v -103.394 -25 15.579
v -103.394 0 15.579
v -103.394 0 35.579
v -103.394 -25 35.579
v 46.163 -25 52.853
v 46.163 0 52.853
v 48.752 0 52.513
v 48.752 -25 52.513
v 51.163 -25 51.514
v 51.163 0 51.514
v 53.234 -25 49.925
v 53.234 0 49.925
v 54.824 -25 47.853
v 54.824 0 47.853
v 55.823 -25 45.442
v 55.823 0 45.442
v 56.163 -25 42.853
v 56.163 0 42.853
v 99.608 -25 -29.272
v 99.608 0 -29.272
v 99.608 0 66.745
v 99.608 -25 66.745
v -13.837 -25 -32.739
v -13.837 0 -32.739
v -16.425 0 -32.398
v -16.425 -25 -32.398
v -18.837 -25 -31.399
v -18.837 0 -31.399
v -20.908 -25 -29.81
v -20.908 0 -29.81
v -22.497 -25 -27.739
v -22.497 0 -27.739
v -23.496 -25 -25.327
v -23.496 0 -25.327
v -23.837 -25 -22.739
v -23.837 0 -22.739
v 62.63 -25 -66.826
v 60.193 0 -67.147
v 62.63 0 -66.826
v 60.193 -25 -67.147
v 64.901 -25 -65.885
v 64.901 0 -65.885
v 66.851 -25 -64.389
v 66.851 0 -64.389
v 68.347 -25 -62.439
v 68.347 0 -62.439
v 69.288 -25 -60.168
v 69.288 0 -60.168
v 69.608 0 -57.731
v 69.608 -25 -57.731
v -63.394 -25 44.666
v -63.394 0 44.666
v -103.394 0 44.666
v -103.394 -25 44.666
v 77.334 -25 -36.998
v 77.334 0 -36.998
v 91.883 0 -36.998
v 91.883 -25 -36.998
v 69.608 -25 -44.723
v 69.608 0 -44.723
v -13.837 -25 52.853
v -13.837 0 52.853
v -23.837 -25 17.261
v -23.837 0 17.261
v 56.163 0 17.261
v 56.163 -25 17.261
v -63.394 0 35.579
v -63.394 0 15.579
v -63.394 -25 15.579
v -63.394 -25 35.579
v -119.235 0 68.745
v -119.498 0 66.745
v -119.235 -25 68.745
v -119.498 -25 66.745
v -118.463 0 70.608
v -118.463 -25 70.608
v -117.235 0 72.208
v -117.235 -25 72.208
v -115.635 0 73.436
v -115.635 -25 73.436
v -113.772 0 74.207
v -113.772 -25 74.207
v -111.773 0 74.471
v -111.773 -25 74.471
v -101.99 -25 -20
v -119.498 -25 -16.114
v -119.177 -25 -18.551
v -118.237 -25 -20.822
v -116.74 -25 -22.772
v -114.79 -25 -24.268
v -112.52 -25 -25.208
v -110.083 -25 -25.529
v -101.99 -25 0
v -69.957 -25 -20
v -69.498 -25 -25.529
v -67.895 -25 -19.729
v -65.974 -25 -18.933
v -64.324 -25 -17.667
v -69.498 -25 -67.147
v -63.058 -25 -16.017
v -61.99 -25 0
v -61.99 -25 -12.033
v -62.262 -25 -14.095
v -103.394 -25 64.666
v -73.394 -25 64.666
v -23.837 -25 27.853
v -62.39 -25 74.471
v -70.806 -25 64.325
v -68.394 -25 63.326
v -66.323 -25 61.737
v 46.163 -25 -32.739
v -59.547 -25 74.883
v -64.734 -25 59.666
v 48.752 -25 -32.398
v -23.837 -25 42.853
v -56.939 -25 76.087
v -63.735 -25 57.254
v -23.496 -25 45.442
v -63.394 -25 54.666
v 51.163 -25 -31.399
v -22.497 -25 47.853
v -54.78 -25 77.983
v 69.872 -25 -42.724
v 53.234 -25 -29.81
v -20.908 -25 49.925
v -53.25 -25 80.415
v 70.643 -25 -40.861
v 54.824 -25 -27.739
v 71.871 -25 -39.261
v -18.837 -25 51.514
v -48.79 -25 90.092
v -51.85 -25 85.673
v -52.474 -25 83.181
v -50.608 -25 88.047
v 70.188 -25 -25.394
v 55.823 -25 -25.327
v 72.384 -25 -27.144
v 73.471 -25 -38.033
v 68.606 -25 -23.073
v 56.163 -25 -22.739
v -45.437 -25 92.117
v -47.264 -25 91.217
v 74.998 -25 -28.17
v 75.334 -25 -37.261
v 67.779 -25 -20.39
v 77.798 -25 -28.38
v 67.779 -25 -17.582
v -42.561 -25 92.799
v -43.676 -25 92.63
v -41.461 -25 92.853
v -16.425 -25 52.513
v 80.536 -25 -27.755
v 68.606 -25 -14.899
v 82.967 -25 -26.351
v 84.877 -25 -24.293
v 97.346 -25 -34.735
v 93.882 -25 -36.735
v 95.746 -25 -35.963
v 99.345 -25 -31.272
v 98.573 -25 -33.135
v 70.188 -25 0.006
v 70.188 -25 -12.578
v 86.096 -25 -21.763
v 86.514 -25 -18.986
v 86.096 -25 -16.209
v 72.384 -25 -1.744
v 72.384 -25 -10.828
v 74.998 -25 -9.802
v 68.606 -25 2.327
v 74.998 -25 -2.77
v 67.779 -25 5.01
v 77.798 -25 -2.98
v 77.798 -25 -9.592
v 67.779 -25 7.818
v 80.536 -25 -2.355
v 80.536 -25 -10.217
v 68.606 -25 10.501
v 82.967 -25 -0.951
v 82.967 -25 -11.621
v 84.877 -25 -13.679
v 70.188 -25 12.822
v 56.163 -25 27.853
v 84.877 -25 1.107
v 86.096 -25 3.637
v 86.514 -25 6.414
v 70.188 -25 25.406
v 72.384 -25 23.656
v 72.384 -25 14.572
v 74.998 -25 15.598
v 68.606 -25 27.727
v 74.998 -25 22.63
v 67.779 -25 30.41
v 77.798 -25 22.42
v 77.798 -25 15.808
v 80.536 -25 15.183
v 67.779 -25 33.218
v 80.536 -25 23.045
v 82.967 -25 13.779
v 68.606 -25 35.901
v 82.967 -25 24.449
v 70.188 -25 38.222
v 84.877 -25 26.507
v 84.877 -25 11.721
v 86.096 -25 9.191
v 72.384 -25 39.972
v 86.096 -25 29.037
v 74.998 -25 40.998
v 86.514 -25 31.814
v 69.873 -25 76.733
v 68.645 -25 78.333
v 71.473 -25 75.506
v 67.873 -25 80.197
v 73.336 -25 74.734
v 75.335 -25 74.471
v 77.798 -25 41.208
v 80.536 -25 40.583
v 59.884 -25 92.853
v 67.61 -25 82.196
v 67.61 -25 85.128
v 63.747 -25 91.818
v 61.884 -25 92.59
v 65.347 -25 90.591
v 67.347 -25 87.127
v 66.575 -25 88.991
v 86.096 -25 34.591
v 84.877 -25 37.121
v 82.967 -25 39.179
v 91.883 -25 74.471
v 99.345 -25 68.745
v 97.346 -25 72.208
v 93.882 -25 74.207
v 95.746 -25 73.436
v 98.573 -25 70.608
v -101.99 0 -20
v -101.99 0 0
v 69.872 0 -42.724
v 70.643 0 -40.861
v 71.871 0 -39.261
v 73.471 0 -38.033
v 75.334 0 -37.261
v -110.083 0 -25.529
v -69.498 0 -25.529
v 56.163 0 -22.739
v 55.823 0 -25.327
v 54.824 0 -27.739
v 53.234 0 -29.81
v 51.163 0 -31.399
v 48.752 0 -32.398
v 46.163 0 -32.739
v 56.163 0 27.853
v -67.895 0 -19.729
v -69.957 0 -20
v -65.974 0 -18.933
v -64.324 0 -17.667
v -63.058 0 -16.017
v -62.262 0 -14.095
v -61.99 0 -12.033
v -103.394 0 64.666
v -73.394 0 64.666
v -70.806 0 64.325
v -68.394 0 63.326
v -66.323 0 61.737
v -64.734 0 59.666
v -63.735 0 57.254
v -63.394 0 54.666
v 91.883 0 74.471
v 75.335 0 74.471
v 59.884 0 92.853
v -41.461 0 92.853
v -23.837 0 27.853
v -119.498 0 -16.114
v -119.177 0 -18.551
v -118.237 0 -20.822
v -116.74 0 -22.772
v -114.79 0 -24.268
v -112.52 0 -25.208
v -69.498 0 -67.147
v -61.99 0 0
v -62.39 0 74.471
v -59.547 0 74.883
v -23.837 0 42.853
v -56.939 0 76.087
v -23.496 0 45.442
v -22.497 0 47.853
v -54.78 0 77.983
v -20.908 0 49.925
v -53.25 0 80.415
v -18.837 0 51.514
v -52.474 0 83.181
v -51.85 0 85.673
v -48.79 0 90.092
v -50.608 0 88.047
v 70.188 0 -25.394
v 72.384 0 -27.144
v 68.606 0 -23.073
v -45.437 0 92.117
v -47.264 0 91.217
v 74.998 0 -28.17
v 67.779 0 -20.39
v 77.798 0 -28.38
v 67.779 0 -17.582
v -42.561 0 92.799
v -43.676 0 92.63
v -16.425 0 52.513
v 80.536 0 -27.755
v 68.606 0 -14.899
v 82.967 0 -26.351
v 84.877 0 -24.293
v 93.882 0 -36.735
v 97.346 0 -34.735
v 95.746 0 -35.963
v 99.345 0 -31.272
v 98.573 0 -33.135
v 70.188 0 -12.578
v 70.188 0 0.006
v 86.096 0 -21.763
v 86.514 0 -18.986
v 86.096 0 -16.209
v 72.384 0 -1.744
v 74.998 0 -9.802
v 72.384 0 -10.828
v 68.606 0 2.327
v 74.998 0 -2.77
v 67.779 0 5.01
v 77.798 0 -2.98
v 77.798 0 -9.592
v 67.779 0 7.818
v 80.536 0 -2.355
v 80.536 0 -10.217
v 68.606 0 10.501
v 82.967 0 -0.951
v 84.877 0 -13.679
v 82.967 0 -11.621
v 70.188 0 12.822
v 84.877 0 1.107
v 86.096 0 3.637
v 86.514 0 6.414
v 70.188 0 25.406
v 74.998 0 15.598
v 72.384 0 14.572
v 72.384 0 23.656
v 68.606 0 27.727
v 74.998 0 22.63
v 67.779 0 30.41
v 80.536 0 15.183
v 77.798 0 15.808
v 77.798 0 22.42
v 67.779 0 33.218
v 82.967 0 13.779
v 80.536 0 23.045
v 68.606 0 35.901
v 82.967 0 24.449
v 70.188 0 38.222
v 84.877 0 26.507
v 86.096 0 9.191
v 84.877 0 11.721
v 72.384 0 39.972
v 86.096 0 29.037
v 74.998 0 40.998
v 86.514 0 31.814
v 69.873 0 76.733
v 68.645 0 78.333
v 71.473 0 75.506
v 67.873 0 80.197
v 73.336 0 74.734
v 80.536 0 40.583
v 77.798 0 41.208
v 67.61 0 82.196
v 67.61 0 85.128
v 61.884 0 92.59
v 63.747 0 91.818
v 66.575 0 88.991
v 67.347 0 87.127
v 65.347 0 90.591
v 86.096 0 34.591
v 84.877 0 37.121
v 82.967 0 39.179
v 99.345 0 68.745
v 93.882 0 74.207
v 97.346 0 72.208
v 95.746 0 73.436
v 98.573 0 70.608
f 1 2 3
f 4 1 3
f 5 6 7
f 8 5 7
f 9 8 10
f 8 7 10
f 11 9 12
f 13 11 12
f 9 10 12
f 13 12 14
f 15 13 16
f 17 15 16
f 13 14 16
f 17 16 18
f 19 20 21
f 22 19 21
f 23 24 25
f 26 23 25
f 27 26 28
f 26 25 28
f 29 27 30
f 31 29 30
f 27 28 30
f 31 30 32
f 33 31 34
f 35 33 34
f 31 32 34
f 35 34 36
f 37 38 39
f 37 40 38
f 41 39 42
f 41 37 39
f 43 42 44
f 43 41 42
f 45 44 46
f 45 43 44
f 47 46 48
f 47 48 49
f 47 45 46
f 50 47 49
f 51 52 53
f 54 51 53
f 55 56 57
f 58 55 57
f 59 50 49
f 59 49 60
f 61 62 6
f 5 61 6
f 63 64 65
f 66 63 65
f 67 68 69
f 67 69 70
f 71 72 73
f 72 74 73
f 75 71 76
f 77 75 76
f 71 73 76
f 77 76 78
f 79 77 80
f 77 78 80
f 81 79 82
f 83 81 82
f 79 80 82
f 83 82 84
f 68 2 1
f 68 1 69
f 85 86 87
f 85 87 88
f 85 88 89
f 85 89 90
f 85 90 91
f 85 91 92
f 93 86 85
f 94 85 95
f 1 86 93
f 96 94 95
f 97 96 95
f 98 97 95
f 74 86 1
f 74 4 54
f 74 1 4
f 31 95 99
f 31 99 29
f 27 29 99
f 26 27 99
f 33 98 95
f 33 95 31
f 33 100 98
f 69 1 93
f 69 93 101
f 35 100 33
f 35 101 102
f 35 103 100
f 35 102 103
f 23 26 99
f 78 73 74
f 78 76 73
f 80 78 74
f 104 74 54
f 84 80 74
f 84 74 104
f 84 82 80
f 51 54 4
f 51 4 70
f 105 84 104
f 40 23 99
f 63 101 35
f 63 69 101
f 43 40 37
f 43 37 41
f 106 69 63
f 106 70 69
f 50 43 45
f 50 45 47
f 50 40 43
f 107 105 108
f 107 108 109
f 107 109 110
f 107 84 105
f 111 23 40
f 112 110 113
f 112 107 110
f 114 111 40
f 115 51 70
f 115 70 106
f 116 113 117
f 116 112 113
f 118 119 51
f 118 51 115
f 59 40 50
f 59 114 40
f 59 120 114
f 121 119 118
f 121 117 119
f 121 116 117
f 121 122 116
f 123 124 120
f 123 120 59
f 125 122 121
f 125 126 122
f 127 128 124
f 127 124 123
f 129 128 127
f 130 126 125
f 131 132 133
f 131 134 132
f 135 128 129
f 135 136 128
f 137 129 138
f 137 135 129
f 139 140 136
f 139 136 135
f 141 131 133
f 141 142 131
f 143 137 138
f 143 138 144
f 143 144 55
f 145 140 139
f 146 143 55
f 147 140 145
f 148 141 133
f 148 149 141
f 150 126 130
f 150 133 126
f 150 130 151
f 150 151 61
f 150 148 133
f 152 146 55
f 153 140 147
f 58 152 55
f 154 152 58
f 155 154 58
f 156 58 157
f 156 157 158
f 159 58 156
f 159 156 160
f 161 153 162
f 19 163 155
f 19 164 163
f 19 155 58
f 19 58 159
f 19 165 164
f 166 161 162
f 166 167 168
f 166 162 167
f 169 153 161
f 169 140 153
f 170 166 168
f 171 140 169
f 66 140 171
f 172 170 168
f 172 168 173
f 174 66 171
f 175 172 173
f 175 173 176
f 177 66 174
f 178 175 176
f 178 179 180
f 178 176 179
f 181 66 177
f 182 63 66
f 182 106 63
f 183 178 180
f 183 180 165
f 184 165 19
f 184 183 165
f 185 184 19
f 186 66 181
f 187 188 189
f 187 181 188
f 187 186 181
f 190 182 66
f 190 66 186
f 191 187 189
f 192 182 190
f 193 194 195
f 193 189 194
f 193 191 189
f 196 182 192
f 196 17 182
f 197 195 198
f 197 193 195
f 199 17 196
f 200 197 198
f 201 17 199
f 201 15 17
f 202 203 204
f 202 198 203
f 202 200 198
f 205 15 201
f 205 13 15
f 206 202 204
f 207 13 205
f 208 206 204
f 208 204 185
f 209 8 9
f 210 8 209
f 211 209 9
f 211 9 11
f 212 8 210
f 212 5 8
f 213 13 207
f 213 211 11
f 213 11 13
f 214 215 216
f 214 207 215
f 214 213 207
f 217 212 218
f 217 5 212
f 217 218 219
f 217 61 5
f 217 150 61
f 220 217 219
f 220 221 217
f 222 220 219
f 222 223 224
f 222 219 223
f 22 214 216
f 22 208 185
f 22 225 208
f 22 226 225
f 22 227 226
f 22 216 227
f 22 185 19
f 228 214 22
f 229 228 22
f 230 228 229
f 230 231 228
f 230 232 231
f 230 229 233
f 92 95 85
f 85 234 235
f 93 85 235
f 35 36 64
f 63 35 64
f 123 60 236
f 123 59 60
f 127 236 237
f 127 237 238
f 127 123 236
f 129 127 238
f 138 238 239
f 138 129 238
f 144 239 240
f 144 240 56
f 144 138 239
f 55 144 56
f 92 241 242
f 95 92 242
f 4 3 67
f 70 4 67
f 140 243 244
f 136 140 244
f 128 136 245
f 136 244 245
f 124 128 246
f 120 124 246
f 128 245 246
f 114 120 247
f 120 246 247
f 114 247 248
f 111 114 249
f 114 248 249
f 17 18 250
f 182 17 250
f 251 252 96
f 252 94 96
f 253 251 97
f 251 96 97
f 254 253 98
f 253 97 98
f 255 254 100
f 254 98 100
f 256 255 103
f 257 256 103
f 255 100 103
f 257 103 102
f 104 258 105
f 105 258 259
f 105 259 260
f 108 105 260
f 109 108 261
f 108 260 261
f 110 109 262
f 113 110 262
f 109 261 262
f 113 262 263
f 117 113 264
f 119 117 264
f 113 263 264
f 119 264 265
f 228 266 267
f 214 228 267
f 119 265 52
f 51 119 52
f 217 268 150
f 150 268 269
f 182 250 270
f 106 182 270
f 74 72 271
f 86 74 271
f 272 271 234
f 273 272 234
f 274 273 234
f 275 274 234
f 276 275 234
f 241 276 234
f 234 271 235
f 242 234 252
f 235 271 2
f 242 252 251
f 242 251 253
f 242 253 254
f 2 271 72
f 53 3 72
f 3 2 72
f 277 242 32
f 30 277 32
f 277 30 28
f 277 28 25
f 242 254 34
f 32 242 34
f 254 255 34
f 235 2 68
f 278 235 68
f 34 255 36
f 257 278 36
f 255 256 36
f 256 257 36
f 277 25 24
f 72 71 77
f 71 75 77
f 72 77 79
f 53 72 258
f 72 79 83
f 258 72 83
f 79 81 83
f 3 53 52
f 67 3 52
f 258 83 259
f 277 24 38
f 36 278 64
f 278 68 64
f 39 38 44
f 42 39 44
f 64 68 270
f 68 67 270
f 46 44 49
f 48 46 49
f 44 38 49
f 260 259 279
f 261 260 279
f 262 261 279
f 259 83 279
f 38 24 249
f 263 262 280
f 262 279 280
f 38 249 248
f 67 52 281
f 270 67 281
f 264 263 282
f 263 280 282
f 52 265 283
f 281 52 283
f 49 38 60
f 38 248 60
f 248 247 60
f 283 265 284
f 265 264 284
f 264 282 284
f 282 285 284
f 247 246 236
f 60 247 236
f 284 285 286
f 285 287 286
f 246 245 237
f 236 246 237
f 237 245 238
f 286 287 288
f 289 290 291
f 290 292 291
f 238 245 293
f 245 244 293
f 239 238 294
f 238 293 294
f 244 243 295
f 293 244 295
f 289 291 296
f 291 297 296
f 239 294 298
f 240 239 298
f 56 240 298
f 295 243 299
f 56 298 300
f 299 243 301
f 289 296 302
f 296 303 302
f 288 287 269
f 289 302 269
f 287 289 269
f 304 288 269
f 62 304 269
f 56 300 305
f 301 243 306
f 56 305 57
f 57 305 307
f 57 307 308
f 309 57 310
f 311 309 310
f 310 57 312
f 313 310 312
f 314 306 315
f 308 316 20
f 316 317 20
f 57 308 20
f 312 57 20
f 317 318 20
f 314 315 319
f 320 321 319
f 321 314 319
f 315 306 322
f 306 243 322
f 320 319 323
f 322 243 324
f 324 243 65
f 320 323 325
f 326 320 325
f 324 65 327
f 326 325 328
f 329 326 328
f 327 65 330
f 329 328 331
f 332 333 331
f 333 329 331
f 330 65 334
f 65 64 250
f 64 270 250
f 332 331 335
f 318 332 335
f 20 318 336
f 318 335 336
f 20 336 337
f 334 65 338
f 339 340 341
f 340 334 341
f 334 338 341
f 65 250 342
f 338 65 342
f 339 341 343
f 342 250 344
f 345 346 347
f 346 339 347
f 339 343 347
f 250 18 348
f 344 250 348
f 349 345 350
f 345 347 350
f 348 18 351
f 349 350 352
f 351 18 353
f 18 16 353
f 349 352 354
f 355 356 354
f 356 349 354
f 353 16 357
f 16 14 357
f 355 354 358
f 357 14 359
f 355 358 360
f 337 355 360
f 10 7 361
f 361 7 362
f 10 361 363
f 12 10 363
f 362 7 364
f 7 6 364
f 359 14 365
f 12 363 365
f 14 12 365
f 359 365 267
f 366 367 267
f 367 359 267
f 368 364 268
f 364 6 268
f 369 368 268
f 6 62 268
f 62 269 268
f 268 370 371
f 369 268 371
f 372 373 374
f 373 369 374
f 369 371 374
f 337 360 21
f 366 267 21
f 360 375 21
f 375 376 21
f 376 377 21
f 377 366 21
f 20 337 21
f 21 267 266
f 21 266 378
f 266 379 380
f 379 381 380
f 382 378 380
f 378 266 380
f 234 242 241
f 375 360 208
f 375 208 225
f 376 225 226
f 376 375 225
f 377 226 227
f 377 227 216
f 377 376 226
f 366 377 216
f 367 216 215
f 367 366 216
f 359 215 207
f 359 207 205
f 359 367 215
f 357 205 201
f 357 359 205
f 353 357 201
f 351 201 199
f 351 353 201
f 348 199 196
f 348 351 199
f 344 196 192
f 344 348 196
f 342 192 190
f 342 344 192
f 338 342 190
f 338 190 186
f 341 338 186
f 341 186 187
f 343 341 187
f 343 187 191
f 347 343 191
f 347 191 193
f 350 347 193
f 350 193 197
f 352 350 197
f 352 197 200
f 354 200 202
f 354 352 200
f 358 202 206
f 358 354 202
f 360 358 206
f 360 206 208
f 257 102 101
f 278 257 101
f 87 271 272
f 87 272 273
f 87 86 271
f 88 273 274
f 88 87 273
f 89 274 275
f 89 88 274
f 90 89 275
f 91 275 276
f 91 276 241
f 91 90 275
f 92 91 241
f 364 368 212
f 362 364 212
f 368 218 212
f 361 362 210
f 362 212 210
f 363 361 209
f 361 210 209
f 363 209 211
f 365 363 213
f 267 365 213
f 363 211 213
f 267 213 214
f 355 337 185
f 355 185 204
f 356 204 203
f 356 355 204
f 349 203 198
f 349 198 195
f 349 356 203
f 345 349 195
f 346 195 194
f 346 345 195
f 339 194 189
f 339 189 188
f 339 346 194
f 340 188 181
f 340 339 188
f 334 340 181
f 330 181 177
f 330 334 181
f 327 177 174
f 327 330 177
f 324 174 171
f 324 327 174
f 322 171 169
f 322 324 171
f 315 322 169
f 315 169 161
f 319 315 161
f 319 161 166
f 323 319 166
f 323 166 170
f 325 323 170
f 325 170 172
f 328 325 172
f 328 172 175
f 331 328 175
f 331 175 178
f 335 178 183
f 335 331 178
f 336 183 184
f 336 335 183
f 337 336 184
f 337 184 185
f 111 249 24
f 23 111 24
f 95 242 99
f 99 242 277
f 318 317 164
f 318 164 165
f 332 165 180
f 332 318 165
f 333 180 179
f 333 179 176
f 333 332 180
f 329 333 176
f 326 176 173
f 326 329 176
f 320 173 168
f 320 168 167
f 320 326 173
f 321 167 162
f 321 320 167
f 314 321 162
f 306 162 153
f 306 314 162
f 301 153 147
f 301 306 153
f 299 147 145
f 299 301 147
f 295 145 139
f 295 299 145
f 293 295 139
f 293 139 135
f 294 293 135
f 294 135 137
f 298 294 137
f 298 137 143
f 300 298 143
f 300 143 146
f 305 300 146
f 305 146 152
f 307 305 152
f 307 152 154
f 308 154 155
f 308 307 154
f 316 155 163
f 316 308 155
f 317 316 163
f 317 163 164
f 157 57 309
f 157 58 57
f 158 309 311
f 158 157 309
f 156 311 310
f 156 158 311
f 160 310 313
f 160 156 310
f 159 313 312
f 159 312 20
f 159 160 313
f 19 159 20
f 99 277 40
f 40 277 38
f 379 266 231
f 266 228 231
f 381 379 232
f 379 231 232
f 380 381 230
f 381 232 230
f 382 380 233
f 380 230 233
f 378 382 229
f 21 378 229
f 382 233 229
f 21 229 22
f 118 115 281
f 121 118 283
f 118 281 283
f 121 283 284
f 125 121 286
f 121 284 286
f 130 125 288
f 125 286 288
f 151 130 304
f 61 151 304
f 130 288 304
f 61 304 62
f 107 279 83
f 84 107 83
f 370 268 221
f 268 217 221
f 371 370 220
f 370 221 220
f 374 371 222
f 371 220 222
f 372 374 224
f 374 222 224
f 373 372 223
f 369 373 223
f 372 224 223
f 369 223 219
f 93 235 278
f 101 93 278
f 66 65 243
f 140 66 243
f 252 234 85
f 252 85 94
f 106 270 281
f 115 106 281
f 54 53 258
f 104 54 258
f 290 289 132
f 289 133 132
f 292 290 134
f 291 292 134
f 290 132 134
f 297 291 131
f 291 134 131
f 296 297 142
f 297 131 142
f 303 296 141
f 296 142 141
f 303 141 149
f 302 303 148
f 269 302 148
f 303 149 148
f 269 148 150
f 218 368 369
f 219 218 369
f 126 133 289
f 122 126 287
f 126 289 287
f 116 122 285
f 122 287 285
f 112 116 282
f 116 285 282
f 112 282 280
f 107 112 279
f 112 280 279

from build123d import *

# Parameters (mm, degrees)
F0_W     = 40
F0_H     = 20
F0_R     = 9.420461
F1_DEPTH = 25
F2_R     = 11.105382
F3_R     = 9.415433
F4_R     = 7.725483
F5_R     = 7.966905


with BuildPart() as f1:
    # F0 (on Front) → F1 (new body)
    with BuildSketch(Plane.XZ):
        with BuildLine():
            Line((-62.390121, 74.47072), (-119.498074, 74.47072))
            Line((-119.498074, 74.47072), (-119.498074, -25.52928))
            Line((-119.498074, -25.52928), (-69.498074, -25.52928))
            Line((-69.498074, -25.52928), (-69.498074, -67.146567))
            Line((-69.498074, -67.146567), (69.608342, -67.146567))
            Line((69.608342, -67.146567), (69.608342, -36.997778))
            Line((69.608342, -36.997778), (99.608342, -36.997778))
            Line((99.608342, -36.997778), (99.608342, 74.47072))
            Line((99.608342, 74.47072), (67.609879, 74.47072))
            Line((67.609879, 74.47072), (67.609879, 92.853433))
            Line((67.609879, 92.853433), (-52.390121, 92.853433))
            Line((-52.390121, 92.853433), (-52.390121, 84.47072))
            ThreePointArc((-52.390121, 84.47072), (-55.319053, 77.399652), (-62.390121, 74.47072))
        make_face()
        with Locations((-81.99026, -10)):
            Rectangle(F0_W, F0_H, mode=Mode.SUBTRACT)
        with BuildLine():
            Line((-23.836674, -22.738976), (-23.836674, 17.261024))
            Line((-23.836674, 17.261024), (56.163326, 17.261024))
            Line((56.163326, 17.261024), (56.163326, -22.738976))
            ThreePointArc((56.163326, -22.738976), (53.234394, -29.810044), (46.163326, -32.738976))
            Line((46.163326, -32.738976), (-13.836674, -32.738976))
            ThreePointArc((-13.836674, -32.738976), (-20.907742, -29.810044), (-23.836674, -22.738976))
        make_face(mode=Mode.SUBTRACT)
        with Locations((77.09389, -18.98604)):
            Circle(F0_R, mode=Mode.SUBTRACT)
        with Locations((77.09389, 6.41396)):
            Circle(F0_R, mode=Mode.SUBTRACT)
        with Locations((-83.39401, 25.578797)):
            Rectangle(F0_W, F0_H, mode=Mode.SUBTRACT)
        with BuildLine():
            Line((-103.39401, 44.666162), (-103.39401, 64.666162))
            Line((-103.39401, 64.666162), (-73.39401, 64.666162))
            ThreePointArc((-73.39401, 64.666162), (-66.322942, 61.73723), (-63.39401, 54.666162))
            Line((-63.39401, 54.666162), (-63.39401, 44.666162))
            Line((-63.39401, 44.666162), (-103.39401, 44.666162))
        make_face(mode=Mode.SUBTRACT)
        with BuildLine():
            Line((56.163326, 27.853433), (-23.836674, 27.853433))
            Line((-23.836674, 27.853433), (-23.836674, 42.853433))
            ThreePointArc((-23.836674, 42.853433), (-20.907742, 49.924501), (-13.836674, 52.853433))
            Line((-13.836674, 52.853433), (46.163326, 52.853433))
            ThreePointArc((46.163326, 52.853433), (53.234394, 49.924501), (56.163326, 42.853433))
            Line((56.163326, 42.853433), (56.163326, 27.853433))
        make_face(mode=Mode.SUBTRACT)
        with Locations((77.09389, 31.81396)):
            Circle(F0_R, mode=Mode.SUBTRACT)
    extrude(amount=F1_DEPTH)

    # F2
    f2_edges = [f1.edges().sort_by_distance(p)[0] for p in [
        (-52.390121, -12.5, 92.853433),
    ]]
    fillet(f2_edges, radius=F2_R)

    # F3
    f3_edges = [f1.edges().sort_by_distance(p)[0] for p in [
        (-119.498074, -12.5, -25.52928),
        (69.608342, -12.5, -67.146567),
    ]]
    fillet(f3_edges, radius=F3_R)

    # F4
    f4_edges = [f1.edges().sort_by_distance(p)[0] for p in [
        (67.609879, -12.5, 92.853433),
        (67.609879, -12.5, 74.47072),
        (99.608342, -12.5, 74.47072),
        (-119.498074, -12.5, 74.47072),
        (99.608342, -12.5, -36.997778),
        (69.608342, -12.5, -36.997778),
    ]]
    fillet(f4_edges, radius=F4_R)

    # F5
    f5_edges = [f1.edges().sort_by_distance(p)[0] for p in [
        (-61.99026, -12.5, -20),
    ]]
    fillet(f5_edges, radius=F5_R)


solid = f1.part
